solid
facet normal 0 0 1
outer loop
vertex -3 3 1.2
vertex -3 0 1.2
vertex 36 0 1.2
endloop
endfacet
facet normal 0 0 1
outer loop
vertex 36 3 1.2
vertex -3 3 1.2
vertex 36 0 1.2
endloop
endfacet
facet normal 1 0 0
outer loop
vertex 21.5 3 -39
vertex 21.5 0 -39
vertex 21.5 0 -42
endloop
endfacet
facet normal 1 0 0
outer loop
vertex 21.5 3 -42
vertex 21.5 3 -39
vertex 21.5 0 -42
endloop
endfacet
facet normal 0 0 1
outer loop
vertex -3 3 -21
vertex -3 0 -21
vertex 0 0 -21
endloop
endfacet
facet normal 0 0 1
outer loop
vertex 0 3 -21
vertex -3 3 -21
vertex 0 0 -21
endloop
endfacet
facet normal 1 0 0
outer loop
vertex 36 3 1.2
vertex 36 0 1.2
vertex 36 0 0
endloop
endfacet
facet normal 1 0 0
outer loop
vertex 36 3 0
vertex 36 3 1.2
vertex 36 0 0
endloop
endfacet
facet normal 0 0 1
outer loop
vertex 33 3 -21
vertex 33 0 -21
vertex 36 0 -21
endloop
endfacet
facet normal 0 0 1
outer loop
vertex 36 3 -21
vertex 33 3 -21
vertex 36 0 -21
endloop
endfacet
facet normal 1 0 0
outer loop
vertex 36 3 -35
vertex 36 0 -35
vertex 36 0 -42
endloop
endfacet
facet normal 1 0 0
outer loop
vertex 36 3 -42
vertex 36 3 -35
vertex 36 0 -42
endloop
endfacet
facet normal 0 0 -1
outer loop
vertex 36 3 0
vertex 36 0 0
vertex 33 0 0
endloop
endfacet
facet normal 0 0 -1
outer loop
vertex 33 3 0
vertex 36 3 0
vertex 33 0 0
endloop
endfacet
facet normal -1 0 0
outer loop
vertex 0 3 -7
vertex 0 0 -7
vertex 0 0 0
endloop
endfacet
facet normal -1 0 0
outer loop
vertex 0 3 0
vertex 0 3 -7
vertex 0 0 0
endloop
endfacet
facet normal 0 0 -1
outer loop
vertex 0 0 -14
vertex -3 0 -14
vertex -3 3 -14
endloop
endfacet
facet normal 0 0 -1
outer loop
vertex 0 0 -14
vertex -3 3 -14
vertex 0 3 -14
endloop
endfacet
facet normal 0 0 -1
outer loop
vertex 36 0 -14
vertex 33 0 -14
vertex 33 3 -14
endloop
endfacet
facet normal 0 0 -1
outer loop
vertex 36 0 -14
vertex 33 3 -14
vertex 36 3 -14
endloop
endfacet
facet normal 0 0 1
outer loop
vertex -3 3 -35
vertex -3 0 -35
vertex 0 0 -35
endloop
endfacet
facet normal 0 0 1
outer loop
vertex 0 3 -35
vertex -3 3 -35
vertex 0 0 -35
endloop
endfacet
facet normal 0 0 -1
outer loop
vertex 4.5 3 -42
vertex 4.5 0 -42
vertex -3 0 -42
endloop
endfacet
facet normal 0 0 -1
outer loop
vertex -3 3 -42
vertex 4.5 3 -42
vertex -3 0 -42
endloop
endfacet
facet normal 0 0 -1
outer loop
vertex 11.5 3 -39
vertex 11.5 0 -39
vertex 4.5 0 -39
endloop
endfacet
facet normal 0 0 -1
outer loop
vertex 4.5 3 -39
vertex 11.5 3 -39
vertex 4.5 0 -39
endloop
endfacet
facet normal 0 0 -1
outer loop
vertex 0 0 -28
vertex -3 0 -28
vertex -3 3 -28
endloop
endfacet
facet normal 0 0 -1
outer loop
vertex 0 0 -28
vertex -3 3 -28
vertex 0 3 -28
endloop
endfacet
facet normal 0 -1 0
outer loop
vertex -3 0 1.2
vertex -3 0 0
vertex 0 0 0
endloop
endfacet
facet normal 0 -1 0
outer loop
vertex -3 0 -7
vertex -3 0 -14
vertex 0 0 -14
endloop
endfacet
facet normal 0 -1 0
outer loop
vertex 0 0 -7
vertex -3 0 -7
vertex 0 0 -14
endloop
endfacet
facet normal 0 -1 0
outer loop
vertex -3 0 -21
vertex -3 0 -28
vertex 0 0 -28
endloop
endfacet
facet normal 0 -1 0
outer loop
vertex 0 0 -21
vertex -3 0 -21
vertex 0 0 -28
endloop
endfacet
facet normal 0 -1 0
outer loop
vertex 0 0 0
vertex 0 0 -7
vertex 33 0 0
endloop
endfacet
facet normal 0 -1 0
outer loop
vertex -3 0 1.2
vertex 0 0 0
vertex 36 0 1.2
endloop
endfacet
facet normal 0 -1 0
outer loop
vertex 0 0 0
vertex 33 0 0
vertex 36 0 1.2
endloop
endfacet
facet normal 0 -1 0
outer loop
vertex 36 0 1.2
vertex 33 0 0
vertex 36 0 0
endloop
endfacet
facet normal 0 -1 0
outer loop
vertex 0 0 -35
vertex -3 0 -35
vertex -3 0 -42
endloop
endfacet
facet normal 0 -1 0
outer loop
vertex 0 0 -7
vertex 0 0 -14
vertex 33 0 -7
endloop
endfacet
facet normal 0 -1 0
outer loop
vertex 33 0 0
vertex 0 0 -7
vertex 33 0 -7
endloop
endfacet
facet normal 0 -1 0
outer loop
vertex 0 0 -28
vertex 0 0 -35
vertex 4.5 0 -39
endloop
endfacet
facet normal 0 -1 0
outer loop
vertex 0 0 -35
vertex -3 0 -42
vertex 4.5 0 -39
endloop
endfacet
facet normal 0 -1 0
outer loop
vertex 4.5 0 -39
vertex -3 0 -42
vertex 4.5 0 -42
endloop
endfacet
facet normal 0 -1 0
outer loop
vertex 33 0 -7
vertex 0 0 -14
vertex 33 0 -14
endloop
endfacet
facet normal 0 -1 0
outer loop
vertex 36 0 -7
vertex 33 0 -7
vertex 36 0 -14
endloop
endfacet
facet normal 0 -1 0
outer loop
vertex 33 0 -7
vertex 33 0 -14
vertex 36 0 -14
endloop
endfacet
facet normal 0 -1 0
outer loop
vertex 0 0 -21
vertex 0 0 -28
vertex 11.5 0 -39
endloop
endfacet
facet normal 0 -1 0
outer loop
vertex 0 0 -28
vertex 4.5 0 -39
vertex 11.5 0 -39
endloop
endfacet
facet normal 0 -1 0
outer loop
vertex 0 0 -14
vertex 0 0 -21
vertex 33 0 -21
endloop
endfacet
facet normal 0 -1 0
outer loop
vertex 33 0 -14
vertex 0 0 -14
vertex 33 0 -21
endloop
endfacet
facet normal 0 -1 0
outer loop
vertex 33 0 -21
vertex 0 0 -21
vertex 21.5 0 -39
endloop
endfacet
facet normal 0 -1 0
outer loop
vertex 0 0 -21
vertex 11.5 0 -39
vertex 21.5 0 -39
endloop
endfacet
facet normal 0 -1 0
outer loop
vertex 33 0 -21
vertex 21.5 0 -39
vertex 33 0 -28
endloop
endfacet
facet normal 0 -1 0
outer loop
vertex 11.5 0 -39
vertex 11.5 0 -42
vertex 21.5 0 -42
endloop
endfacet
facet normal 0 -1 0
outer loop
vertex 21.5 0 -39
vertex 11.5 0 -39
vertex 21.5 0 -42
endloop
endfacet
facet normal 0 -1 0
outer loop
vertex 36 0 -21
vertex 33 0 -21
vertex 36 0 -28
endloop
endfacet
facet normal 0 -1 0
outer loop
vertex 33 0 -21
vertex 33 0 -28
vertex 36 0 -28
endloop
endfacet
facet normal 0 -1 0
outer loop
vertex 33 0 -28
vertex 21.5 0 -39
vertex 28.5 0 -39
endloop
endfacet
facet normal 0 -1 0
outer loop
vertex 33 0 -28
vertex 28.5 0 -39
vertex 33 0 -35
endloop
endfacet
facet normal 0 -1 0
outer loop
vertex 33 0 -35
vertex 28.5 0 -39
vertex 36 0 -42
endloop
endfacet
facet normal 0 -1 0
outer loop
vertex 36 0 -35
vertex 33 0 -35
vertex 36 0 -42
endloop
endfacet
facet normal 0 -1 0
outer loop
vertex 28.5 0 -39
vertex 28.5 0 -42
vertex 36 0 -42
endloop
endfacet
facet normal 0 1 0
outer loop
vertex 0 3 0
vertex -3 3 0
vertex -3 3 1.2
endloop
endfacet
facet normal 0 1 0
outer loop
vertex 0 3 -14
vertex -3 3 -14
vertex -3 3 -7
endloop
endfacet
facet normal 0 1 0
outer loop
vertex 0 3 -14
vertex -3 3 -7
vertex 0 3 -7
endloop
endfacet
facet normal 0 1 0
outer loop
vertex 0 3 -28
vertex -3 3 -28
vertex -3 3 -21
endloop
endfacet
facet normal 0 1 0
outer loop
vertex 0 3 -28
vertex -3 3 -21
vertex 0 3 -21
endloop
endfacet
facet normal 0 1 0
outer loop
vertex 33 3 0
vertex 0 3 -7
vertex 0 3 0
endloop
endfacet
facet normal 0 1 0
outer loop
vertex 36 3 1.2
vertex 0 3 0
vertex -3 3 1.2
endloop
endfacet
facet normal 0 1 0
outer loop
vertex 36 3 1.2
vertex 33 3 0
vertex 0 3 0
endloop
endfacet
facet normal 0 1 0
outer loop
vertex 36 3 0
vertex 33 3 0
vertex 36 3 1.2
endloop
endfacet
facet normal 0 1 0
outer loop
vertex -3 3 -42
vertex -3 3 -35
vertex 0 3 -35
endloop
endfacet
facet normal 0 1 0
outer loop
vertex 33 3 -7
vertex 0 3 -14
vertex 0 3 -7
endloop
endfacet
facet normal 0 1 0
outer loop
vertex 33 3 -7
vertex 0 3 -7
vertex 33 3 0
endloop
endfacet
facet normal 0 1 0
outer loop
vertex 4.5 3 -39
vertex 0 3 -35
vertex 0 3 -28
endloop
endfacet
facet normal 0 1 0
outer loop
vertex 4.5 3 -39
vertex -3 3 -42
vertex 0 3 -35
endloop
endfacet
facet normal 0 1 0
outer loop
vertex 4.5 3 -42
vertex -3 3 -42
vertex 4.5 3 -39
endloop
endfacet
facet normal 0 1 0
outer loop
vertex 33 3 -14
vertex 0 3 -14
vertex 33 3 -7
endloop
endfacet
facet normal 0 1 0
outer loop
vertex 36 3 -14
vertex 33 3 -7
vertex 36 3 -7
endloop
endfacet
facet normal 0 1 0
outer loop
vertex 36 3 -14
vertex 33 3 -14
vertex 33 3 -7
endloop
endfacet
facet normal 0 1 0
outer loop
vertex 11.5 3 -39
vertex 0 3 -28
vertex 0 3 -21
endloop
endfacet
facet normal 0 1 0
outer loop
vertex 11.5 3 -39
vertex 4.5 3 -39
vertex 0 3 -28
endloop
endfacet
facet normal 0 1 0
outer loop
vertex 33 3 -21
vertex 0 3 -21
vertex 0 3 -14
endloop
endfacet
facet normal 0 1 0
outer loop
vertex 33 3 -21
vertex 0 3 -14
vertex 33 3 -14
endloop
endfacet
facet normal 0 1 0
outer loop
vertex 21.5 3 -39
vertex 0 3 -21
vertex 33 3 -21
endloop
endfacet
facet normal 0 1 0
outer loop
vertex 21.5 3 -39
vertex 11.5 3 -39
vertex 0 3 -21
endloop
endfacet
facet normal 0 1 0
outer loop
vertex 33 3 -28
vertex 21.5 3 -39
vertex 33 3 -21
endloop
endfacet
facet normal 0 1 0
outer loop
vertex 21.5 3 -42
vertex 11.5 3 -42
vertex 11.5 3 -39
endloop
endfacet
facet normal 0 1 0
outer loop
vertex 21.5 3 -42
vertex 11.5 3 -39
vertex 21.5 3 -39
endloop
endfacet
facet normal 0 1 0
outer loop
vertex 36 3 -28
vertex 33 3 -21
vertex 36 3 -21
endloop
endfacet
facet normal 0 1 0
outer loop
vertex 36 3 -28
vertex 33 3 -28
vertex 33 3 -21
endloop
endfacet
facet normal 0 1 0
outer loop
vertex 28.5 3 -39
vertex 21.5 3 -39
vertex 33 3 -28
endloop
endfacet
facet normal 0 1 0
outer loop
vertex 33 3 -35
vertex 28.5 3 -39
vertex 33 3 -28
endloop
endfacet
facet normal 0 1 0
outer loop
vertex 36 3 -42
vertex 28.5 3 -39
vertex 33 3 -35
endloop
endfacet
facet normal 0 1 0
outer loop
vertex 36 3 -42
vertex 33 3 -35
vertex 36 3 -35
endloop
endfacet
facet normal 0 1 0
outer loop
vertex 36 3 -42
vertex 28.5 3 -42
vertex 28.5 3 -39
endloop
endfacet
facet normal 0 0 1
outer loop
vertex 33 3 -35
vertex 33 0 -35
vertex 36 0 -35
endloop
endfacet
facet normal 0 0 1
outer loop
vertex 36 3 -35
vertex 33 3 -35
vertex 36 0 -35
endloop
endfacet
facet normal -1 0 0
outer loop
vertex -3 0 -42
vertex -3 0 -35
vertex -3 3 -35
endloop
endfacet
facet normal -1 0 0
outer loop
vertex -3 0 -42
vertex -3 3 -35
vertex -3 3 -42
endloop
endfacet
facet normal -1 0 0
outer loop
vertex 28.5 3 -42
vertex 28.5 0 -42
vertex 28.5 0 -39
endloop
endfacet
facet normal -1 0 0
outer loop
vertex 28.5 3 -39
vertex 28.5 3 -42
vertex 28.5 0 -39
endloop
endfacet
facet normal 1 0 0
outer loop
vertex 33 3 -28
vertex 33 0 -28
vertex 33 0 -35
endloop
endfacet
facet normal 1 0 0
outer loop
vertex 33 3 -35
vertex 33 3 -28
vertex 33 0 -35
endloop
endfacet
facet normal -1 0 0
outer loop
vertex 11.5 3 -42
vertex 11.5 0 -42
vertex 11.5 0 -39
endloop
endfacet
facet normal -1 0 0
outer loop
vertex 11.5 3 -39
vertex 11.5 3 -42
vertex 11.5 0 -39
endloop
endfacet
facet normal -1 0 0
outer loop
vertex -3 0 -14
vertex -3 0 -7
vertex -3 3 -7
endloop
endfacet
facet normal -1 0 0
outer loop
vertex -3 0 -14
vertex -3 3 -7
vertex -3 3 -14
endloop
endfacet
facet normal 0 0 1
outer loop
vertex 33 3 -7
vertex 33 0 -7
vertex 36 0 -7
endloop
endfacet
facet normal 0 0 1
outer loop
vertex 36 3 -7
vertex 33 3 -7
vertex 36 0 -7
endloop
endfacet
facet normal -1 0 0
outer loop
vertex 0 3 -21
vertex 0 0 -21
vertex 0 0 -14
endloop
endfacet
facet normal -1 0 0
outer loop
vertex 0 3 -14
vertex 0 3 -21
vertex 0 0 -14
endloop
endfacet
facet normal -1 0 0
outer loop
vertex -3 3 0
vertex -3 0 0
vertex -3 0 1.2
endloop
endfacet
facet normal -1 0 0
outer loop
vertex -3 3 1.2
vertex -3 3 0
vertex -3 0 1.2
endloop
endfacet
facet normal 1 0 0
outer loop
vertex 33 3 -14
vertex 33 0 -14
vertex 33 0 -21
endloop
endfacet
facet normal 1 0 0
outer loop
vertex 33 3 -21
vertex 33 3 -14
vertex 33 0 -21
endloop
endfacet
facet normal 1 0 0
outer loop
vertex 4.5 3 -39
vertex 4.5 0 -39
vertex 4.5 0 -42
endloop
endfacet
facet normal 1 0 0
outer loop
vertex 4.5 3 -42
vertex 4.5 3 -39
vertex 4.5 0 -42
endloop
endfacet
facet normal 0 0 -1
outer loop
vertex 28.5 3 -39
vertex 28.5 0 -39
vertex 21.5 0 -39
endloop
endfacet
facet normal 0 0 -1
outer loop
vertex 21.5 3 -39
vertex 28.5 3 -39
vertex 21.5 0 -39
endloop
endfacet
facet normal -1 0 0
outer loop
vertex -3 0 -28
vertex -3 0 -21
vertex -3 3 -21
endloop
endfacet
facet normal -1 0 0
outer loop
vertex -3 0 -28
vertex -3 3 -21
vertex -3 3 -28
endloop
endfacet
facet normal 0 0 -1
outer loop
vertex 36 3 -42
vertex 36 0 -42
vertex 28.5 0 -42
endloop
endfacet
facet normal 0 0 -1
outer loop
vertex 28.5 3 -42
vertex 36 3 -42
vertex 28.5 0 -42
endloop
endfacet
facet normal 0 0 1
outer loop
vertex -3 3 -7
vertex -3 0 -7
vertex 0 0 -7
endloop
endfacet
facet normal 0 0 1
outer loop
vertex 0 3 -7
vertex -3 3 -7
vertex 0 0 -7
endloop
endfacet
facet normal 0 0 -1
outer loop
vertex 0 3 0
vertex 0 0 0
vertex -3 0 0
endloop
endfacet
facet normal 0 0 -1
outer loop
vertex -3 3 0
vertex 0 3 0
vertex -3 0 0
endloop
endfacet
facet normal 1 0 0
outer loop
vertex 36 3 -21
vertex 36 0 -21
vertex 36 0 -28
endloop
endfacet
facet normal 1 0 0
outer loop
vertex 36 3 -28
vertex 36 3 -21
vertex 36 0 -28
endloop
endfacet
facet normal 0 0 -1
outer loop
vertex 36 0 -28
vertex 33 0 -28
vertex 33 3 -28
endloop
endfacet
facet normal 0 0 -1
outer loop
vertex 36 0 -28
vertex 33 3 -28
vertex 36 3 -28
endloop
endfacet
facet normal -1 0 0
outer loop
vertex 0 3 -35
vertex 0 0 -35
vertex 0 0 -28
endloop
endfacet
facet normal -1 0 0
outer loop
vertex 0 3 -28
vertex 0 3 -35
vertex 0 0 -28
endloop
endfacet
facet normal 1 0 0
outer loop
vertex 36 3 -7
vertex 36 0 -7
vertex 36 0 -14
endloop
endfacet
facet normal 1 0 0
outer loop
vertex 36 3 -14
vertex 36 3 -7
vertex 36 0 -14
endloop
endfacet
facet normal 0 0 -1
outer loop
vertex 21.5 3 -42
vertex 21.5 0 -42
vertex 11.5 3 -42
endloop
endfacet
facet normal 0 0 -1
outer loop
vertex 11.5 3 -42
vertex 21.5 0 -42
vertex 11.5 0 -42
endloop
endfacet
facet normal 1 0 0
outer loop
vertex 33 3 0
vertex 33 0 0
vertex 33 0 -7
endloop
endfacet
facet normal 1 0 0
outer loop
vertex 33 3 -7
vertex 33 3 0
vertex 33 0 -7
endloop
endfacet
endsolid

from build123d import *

# Parameters (mm, degrees)
SKETCH1_W           = 3
SKETCH1_H           = 7
BOSS_EXTRUDE1_DEPTH = 3


with BuildPart() as part:
    # Sketch1 → Boss-Extrude1 (new body)
    with BuildSketch(Plane(origin=(0, 0, 0), x_dir=(1, 0, 0), z_dir=(0, 1, 0))):
        Polygon((0, 35), (0, 28), (0, 21), (0, 14), (0, 7), (0, 0), (33, 0), (33, 7), (33, 14), (33, 21), (33, 28), (33, 35), (33, 42), (28.5, 42), (28.5, 39), (21.5, 39), (21.5, 42), (11.5, 42), (11.5, 39), (4.5, 39), (4.5, 42), (0, 42), align=None)
        with Locations((-1.5, 38.5)):
            Rectangle(SKETCH1_W, SKETCH1_H)
        with Locations((-1.5, 24.5)):
            Rectangle(SKETCH1_W, SKETCH1_H)
        with Locations((-1.5, 10.5)):
            Rectangle(SKETCH1_W, SKETCH1_H)
        with Locations((34.5, 10.5)):
            Rectangle(SKETCH1_W, SKETCH1_H)
        with Locations((34.5, 24.5)):
            Rectangle(SKETCH1_W, SKETCH1_H)
        with Locations((34.5, 38.5)):
            Rectangle(SKETCH1_W, SKETCH1_H)
        Polygon((33, 0), (0, 0), (-3, 0), (-3, -1.2), (36, -1.2), (36, 0), align=None)
    extrude(amount=BOSS_EXTRUDE1_DEPTH)


solid = part.part
